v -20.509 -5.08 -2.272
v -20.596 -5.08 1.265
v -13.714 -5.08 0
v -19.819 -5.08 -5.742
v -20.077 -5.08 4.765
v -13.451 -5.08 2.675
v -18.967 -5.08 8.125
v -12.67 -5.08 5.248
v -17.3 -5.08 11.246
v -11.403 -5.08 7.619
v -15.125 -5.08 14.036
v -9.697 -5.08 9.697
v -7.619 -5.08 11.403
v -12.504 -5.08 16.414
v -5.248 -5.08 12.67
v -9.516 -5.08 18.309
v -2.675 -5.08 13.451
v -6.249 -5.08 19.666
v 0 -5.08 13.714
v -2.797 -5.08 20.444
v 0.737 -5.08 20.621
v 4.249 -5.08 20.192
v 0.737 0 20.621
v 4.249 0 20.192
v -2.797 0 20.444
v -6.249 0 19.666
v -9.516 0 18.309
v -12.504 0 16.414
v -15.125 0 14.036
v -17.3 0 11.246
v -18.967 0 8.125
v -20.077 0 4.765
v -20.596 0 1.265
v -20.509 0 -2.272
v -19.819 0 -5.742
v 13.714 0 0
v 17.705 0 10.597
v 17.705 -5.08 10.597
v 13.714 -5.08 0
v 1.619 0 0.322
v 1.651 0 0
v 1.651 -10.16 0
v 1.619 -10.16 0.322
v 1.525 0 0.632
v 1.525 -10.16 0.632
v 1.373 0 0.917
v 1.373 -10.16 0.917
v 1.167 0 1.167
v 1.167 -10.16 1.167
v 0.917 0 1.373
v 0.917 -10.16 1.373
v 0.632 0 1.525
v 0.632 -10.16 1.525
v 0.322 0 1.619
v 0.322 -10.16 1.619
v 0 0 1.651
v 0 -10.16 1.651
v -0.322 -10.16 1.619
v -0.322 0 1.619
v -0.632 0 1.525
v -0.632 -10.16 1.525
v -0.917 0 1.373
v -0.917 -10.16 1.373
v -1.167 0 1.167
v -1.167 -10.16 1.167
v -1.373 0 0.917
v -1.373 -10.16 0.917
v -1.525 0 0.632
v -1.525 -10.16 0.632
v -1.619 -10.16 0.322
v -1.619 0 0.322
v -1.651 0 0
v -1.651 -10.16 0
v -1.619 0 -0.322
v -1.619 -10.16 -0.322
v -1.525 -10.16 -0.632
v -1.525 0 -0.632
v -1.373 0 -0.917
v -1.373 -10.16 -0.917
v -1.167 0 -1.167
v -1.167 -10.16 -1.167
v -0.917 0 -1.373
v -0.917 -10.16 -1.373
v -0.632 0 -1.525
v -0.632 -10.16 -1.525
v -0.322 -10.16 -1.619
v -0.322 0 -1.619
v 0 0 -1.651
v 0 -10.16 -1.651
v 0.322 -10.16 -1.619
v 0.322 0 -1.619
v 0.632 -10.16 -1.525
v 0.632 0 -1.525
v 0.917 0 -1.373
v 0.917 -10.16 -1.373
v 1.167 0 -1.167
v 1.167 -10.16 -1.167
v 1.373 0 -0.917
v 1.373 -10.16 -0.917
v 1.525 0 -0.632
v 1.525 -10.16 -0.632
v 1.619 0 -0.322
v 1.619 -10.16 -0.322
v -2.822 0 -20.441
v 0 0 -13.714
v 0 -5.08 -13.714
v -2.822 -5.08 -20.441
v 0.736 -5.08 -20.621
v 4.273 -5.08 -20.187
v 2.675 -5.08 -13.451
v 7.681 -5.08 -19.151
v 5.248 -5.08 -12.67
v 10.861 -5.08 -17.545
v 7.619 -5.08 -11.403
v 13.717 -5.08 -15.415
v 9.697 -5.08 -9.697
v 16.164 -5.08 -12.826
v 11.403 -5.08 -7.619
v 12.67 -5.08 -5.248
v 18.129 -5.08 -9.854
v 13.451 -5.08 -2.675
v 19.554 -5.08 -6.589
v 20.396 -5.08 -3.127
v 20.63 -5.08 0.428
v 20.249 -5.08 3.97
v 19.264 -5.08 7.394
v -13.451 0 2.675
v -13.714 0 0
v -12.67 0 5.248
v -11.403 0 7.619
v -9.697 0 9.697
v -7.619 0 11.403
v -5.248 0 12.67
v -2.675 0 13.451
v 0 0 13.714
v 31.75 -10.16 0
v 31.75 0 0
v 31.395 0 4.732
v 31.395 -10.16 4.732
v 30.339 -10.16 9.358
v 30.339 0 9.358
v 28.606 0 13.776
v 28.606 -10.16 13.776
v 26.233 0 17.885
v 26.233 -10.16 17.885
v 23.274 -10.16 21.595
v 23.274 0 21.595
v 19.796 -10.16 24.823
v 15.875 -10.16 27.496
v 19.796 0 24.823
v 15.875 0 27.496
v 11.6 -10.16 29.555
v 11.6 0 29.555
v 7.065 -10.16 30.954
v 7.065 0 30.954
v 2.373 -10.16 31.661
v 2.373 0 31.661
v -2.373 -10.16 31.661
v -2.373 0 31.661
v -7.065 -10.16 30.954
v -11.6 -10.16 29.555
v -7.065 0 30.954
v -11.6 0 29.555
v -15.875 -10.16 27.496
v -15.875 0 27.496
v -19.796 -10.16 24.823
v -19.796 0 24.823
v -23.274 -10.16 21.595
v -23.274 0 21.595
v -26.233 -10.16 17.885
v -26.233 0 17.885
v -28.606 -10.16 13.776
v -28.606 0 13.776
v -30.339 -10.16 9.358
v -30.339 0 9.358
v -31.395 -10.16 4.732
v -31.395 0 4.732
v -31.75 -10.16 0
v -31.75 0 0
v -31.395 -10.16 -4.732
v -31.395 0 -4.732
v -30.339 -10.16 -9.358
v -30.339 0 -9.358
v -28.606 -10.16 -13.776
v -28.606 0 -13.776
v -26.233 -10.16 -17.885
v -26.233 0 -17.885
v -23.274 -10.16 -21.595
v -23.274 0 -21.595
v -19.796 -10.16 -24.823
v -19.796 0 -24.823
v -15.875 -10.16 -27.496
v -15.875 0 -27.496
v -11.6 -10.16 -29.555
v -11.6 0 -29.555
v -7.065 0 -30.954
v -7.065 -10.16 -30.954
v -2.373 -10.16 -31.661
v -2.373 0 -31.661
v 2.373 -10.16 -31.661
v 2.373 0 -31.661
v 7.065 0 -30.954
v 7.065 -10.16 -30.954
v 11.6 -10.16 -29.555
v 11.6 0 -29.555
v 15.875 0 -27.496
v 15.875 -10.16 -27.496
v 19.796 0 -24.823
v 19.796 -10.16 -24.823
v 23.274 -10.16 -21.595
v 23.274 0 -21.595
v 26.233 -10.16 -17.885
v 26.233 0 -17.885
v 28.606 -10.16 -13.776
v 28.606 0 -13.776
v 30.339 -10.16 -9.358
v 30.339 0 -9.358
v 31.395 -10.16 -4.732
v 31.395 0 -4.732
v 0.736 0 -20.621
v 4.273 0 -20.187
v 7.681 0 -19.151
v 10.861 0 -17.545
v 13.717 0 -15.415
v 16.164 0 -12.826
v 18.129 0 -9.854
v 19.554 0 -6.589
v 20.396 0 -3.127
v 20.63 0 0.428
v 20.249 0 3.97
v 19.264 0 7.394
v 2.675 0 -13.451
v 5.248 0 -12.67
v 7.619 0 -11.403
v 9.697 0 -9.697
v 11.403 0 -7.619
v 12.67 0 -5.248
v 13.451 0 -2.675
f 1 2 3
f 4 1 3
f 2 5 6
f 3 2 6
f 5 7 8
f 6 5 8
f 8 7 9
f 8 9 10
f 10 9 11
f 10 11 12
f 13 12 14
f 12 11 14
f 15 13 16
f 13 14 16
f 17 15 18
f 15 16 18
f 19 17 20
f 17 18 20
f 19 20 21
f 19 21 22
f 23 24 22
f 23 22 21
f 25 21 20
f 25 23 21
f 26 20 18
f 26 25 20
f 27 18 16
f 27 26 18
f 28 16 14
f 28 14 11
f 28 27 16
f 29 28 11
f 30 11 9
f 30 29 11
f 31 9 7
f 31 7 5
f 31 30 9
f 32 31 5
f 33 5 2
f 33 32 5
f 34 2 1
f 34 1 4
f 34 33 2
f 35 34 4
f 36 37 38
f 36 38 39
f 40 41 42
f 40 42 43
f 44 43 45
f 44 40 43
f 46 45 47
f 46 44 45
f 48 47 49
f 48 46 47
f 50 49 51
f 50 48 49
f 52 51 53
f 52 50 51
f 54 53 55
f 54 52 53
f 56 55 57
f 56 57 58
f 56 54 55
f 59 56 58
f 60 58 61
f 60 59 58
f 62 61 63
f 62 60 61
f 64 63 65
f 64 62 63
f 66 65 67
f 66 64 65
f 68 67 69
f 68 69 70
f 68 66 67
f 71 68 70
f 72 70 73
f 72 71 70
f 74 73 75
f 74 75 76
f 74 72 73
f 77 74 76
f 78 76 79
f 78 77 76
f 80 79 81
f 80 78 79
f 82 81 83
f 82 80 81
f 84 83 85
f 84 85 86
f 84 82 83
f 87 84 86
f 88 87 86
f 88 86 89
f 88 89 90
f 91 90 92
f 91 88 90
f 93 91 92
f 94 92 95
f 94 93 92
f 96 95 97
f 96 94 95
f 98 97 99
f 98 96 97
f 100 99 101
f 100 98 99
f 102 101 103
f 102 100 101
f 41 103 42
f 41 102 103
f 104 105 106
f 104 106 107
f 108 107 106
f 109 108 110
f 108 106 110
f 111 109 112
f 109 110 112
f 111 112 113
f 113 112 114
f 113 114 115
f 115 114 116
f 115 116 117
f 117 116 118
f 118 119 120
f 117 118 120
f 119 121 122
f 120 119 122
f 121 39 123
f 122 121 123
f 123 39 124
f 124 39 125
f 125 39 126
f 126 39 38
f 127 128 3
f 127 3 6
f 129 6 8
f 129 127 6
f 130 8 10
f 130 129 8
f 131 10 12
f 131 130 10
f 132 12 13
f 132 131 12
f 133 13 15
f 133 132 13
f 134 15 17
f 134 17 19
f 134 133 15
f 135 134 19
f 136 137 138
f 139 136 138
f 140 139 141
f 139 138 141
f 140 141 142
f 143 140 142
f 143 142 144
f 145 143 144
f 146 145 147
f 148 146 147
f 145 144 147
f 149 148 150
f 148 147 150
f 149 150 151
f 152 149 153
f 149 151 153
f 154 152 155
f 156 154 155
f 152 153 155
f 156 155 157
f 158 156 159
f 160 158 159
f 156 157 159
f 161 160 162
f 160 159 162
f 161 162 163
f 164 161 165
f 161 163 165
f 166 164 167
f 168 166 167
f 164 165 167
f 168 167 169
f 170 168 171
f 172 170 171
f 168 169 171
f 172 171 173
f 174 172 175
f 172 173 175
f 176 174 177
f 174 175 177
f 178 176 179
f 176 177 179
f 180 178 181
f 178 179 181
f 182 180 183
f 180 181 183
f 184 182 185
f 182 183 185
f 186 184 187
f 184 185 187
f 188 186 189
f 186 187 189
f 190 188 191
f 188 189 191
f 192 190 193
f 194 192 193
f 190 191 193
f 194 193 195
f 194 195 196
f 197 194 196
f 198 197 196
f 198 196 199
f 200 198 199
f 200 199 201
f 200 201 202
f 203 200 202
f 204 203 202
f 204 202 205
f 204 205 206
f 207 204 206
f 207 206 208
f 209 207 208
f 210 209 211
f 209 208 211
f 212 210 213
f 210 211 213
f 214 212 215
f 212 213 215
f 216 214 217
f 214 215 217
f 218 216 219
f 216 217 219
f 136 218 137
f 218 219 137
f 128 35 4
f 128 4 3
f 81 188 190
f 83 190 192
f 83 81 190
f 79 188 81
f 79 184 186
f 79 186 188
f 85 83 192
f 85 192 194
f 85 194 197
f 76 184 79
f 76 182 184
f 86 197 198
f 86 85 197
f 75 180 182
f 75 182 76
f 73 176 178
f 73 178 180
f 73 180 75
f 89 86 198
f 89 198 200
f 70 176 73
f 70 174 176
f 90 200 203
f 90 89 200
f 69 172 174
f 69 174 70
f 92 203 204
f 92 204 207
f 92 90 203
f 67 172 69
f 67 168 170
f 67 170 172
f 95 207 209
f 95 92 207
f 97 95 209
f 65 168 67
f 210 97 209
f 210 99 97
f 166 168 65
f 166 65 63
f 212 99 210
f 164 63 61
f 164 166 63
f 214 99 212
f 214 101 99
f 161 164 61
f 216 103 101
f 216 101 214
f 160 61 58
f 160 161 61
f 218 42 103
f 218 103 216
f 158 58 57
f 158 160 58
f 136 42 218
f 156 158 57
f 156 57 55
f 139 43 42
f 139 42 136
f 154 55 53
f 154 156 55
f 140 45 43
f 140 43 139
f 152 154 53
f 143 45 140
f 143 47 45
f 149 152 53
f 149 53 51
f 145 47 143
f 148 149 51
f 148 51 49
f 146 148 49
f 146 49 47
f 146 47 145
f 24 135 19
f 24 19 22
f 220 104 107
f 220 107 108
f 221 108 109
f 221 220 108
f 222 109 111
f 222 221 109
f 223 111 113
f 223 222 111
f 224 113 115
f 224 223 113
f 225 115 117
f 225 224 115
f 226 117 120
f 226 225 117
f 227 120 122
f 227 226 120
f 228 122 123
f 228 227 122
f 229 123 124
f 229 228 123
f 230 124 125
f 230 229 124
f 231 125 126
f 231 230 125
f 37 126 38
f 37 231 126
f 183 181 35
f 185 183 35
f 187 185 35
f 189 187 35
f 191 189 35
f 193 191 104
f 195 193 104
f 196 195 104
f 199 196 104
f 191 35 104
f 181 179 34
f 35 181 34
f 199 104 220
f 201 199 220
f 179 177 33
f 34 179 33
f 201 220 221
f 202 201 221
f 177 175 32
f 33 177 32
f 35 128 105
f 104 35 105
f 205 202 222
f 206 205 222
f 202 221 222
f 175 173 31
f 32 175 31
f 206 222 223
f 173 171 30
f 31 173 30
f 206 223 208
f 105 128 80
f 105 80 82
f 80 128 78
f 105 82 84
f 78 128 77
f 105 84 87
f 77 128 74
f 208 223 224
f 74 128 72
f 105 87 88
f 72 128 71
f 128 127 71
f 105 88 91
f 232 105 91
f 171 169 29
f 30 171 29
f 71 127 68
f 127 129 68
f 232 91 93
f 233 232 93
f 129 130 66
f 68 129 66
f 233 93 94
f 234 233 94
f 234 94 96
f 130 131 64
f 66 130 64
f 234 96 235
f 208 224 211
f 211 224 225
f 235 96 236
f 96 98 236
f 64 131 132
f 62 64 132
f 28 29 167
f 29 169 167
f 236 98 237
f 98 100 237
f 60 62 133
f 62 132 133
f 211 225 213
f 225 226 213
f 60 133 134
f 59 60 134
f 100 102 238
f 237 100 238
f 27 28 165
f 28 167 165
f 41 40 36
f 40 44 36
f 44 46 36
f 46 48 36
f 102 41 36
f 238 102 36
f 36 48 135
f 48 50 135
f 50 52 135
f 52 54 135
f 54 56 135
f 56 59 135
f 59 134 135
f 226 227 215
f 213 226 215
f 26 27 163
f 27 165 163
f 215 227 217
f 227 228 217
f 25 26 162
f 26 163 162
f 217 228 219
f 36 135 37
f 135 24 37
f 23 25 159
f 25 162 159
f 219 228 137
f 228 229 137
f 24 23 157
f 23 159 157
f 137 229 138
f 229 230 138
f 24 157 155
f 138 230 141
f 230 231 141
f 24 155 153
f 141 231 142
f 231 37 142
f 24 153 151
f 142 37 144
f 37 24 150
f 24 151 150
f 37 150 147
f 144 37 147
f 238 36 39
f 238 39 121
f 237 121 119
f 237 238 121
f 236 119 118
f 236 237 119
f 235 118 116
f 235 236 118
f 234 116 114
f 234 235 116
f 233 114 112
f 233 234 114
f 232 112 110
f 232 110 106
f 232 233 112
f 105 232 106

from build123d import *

# Parameters (mm, degrees)
F0_R     = 31.75
F0_R_2   = 1.651
F1_DEPTH = 10.16
F3_DEPTH = 5.08


with BuildPart() as f1:
    # F0 (on Front) → F1 (new body)
    with BuildSketch(Plane.XZ):
        Circle(F0_R)
        Circle(F0_R_2, mode=Mode.SUBTRACT)
    extrude(amount=F1_DEPTH)

    # F2 (on Front) → F3 (cut)
    with BuildSketch(Plane.XZ):
        with BuildLine():
            Line((0, 13.714062), (4.249023, 20.192205))
            ThreePointArc((4.249023, 20.192205), (-15.124809, 14.036363), (-19.819271, -5.742458))
            Line((-19.819271, -5.742458), (-13.714062, 0))
            ThreePointArc((-13.714062, 0), (-9.697307, 9.697307), (0, 13.714062))
        make_face()
        with BuildLine():
            ThreePointArc((13.714062, 0), (9.697307, -9.697307), (0, -13.714062))
            Line((0, -13.714062), (-2.821576, -20.440598))
            ThreePointArc((-2.821576, -20.440598), (17.210942, -11.382565), (17.705395, 10.59709))
            Line((17.705395, 10.59709), (13.714062, 0))
        make_face()
    extrude(amount=F3_DEPTH, mode=Mode.SUBTRACT)


solid = f1.part
